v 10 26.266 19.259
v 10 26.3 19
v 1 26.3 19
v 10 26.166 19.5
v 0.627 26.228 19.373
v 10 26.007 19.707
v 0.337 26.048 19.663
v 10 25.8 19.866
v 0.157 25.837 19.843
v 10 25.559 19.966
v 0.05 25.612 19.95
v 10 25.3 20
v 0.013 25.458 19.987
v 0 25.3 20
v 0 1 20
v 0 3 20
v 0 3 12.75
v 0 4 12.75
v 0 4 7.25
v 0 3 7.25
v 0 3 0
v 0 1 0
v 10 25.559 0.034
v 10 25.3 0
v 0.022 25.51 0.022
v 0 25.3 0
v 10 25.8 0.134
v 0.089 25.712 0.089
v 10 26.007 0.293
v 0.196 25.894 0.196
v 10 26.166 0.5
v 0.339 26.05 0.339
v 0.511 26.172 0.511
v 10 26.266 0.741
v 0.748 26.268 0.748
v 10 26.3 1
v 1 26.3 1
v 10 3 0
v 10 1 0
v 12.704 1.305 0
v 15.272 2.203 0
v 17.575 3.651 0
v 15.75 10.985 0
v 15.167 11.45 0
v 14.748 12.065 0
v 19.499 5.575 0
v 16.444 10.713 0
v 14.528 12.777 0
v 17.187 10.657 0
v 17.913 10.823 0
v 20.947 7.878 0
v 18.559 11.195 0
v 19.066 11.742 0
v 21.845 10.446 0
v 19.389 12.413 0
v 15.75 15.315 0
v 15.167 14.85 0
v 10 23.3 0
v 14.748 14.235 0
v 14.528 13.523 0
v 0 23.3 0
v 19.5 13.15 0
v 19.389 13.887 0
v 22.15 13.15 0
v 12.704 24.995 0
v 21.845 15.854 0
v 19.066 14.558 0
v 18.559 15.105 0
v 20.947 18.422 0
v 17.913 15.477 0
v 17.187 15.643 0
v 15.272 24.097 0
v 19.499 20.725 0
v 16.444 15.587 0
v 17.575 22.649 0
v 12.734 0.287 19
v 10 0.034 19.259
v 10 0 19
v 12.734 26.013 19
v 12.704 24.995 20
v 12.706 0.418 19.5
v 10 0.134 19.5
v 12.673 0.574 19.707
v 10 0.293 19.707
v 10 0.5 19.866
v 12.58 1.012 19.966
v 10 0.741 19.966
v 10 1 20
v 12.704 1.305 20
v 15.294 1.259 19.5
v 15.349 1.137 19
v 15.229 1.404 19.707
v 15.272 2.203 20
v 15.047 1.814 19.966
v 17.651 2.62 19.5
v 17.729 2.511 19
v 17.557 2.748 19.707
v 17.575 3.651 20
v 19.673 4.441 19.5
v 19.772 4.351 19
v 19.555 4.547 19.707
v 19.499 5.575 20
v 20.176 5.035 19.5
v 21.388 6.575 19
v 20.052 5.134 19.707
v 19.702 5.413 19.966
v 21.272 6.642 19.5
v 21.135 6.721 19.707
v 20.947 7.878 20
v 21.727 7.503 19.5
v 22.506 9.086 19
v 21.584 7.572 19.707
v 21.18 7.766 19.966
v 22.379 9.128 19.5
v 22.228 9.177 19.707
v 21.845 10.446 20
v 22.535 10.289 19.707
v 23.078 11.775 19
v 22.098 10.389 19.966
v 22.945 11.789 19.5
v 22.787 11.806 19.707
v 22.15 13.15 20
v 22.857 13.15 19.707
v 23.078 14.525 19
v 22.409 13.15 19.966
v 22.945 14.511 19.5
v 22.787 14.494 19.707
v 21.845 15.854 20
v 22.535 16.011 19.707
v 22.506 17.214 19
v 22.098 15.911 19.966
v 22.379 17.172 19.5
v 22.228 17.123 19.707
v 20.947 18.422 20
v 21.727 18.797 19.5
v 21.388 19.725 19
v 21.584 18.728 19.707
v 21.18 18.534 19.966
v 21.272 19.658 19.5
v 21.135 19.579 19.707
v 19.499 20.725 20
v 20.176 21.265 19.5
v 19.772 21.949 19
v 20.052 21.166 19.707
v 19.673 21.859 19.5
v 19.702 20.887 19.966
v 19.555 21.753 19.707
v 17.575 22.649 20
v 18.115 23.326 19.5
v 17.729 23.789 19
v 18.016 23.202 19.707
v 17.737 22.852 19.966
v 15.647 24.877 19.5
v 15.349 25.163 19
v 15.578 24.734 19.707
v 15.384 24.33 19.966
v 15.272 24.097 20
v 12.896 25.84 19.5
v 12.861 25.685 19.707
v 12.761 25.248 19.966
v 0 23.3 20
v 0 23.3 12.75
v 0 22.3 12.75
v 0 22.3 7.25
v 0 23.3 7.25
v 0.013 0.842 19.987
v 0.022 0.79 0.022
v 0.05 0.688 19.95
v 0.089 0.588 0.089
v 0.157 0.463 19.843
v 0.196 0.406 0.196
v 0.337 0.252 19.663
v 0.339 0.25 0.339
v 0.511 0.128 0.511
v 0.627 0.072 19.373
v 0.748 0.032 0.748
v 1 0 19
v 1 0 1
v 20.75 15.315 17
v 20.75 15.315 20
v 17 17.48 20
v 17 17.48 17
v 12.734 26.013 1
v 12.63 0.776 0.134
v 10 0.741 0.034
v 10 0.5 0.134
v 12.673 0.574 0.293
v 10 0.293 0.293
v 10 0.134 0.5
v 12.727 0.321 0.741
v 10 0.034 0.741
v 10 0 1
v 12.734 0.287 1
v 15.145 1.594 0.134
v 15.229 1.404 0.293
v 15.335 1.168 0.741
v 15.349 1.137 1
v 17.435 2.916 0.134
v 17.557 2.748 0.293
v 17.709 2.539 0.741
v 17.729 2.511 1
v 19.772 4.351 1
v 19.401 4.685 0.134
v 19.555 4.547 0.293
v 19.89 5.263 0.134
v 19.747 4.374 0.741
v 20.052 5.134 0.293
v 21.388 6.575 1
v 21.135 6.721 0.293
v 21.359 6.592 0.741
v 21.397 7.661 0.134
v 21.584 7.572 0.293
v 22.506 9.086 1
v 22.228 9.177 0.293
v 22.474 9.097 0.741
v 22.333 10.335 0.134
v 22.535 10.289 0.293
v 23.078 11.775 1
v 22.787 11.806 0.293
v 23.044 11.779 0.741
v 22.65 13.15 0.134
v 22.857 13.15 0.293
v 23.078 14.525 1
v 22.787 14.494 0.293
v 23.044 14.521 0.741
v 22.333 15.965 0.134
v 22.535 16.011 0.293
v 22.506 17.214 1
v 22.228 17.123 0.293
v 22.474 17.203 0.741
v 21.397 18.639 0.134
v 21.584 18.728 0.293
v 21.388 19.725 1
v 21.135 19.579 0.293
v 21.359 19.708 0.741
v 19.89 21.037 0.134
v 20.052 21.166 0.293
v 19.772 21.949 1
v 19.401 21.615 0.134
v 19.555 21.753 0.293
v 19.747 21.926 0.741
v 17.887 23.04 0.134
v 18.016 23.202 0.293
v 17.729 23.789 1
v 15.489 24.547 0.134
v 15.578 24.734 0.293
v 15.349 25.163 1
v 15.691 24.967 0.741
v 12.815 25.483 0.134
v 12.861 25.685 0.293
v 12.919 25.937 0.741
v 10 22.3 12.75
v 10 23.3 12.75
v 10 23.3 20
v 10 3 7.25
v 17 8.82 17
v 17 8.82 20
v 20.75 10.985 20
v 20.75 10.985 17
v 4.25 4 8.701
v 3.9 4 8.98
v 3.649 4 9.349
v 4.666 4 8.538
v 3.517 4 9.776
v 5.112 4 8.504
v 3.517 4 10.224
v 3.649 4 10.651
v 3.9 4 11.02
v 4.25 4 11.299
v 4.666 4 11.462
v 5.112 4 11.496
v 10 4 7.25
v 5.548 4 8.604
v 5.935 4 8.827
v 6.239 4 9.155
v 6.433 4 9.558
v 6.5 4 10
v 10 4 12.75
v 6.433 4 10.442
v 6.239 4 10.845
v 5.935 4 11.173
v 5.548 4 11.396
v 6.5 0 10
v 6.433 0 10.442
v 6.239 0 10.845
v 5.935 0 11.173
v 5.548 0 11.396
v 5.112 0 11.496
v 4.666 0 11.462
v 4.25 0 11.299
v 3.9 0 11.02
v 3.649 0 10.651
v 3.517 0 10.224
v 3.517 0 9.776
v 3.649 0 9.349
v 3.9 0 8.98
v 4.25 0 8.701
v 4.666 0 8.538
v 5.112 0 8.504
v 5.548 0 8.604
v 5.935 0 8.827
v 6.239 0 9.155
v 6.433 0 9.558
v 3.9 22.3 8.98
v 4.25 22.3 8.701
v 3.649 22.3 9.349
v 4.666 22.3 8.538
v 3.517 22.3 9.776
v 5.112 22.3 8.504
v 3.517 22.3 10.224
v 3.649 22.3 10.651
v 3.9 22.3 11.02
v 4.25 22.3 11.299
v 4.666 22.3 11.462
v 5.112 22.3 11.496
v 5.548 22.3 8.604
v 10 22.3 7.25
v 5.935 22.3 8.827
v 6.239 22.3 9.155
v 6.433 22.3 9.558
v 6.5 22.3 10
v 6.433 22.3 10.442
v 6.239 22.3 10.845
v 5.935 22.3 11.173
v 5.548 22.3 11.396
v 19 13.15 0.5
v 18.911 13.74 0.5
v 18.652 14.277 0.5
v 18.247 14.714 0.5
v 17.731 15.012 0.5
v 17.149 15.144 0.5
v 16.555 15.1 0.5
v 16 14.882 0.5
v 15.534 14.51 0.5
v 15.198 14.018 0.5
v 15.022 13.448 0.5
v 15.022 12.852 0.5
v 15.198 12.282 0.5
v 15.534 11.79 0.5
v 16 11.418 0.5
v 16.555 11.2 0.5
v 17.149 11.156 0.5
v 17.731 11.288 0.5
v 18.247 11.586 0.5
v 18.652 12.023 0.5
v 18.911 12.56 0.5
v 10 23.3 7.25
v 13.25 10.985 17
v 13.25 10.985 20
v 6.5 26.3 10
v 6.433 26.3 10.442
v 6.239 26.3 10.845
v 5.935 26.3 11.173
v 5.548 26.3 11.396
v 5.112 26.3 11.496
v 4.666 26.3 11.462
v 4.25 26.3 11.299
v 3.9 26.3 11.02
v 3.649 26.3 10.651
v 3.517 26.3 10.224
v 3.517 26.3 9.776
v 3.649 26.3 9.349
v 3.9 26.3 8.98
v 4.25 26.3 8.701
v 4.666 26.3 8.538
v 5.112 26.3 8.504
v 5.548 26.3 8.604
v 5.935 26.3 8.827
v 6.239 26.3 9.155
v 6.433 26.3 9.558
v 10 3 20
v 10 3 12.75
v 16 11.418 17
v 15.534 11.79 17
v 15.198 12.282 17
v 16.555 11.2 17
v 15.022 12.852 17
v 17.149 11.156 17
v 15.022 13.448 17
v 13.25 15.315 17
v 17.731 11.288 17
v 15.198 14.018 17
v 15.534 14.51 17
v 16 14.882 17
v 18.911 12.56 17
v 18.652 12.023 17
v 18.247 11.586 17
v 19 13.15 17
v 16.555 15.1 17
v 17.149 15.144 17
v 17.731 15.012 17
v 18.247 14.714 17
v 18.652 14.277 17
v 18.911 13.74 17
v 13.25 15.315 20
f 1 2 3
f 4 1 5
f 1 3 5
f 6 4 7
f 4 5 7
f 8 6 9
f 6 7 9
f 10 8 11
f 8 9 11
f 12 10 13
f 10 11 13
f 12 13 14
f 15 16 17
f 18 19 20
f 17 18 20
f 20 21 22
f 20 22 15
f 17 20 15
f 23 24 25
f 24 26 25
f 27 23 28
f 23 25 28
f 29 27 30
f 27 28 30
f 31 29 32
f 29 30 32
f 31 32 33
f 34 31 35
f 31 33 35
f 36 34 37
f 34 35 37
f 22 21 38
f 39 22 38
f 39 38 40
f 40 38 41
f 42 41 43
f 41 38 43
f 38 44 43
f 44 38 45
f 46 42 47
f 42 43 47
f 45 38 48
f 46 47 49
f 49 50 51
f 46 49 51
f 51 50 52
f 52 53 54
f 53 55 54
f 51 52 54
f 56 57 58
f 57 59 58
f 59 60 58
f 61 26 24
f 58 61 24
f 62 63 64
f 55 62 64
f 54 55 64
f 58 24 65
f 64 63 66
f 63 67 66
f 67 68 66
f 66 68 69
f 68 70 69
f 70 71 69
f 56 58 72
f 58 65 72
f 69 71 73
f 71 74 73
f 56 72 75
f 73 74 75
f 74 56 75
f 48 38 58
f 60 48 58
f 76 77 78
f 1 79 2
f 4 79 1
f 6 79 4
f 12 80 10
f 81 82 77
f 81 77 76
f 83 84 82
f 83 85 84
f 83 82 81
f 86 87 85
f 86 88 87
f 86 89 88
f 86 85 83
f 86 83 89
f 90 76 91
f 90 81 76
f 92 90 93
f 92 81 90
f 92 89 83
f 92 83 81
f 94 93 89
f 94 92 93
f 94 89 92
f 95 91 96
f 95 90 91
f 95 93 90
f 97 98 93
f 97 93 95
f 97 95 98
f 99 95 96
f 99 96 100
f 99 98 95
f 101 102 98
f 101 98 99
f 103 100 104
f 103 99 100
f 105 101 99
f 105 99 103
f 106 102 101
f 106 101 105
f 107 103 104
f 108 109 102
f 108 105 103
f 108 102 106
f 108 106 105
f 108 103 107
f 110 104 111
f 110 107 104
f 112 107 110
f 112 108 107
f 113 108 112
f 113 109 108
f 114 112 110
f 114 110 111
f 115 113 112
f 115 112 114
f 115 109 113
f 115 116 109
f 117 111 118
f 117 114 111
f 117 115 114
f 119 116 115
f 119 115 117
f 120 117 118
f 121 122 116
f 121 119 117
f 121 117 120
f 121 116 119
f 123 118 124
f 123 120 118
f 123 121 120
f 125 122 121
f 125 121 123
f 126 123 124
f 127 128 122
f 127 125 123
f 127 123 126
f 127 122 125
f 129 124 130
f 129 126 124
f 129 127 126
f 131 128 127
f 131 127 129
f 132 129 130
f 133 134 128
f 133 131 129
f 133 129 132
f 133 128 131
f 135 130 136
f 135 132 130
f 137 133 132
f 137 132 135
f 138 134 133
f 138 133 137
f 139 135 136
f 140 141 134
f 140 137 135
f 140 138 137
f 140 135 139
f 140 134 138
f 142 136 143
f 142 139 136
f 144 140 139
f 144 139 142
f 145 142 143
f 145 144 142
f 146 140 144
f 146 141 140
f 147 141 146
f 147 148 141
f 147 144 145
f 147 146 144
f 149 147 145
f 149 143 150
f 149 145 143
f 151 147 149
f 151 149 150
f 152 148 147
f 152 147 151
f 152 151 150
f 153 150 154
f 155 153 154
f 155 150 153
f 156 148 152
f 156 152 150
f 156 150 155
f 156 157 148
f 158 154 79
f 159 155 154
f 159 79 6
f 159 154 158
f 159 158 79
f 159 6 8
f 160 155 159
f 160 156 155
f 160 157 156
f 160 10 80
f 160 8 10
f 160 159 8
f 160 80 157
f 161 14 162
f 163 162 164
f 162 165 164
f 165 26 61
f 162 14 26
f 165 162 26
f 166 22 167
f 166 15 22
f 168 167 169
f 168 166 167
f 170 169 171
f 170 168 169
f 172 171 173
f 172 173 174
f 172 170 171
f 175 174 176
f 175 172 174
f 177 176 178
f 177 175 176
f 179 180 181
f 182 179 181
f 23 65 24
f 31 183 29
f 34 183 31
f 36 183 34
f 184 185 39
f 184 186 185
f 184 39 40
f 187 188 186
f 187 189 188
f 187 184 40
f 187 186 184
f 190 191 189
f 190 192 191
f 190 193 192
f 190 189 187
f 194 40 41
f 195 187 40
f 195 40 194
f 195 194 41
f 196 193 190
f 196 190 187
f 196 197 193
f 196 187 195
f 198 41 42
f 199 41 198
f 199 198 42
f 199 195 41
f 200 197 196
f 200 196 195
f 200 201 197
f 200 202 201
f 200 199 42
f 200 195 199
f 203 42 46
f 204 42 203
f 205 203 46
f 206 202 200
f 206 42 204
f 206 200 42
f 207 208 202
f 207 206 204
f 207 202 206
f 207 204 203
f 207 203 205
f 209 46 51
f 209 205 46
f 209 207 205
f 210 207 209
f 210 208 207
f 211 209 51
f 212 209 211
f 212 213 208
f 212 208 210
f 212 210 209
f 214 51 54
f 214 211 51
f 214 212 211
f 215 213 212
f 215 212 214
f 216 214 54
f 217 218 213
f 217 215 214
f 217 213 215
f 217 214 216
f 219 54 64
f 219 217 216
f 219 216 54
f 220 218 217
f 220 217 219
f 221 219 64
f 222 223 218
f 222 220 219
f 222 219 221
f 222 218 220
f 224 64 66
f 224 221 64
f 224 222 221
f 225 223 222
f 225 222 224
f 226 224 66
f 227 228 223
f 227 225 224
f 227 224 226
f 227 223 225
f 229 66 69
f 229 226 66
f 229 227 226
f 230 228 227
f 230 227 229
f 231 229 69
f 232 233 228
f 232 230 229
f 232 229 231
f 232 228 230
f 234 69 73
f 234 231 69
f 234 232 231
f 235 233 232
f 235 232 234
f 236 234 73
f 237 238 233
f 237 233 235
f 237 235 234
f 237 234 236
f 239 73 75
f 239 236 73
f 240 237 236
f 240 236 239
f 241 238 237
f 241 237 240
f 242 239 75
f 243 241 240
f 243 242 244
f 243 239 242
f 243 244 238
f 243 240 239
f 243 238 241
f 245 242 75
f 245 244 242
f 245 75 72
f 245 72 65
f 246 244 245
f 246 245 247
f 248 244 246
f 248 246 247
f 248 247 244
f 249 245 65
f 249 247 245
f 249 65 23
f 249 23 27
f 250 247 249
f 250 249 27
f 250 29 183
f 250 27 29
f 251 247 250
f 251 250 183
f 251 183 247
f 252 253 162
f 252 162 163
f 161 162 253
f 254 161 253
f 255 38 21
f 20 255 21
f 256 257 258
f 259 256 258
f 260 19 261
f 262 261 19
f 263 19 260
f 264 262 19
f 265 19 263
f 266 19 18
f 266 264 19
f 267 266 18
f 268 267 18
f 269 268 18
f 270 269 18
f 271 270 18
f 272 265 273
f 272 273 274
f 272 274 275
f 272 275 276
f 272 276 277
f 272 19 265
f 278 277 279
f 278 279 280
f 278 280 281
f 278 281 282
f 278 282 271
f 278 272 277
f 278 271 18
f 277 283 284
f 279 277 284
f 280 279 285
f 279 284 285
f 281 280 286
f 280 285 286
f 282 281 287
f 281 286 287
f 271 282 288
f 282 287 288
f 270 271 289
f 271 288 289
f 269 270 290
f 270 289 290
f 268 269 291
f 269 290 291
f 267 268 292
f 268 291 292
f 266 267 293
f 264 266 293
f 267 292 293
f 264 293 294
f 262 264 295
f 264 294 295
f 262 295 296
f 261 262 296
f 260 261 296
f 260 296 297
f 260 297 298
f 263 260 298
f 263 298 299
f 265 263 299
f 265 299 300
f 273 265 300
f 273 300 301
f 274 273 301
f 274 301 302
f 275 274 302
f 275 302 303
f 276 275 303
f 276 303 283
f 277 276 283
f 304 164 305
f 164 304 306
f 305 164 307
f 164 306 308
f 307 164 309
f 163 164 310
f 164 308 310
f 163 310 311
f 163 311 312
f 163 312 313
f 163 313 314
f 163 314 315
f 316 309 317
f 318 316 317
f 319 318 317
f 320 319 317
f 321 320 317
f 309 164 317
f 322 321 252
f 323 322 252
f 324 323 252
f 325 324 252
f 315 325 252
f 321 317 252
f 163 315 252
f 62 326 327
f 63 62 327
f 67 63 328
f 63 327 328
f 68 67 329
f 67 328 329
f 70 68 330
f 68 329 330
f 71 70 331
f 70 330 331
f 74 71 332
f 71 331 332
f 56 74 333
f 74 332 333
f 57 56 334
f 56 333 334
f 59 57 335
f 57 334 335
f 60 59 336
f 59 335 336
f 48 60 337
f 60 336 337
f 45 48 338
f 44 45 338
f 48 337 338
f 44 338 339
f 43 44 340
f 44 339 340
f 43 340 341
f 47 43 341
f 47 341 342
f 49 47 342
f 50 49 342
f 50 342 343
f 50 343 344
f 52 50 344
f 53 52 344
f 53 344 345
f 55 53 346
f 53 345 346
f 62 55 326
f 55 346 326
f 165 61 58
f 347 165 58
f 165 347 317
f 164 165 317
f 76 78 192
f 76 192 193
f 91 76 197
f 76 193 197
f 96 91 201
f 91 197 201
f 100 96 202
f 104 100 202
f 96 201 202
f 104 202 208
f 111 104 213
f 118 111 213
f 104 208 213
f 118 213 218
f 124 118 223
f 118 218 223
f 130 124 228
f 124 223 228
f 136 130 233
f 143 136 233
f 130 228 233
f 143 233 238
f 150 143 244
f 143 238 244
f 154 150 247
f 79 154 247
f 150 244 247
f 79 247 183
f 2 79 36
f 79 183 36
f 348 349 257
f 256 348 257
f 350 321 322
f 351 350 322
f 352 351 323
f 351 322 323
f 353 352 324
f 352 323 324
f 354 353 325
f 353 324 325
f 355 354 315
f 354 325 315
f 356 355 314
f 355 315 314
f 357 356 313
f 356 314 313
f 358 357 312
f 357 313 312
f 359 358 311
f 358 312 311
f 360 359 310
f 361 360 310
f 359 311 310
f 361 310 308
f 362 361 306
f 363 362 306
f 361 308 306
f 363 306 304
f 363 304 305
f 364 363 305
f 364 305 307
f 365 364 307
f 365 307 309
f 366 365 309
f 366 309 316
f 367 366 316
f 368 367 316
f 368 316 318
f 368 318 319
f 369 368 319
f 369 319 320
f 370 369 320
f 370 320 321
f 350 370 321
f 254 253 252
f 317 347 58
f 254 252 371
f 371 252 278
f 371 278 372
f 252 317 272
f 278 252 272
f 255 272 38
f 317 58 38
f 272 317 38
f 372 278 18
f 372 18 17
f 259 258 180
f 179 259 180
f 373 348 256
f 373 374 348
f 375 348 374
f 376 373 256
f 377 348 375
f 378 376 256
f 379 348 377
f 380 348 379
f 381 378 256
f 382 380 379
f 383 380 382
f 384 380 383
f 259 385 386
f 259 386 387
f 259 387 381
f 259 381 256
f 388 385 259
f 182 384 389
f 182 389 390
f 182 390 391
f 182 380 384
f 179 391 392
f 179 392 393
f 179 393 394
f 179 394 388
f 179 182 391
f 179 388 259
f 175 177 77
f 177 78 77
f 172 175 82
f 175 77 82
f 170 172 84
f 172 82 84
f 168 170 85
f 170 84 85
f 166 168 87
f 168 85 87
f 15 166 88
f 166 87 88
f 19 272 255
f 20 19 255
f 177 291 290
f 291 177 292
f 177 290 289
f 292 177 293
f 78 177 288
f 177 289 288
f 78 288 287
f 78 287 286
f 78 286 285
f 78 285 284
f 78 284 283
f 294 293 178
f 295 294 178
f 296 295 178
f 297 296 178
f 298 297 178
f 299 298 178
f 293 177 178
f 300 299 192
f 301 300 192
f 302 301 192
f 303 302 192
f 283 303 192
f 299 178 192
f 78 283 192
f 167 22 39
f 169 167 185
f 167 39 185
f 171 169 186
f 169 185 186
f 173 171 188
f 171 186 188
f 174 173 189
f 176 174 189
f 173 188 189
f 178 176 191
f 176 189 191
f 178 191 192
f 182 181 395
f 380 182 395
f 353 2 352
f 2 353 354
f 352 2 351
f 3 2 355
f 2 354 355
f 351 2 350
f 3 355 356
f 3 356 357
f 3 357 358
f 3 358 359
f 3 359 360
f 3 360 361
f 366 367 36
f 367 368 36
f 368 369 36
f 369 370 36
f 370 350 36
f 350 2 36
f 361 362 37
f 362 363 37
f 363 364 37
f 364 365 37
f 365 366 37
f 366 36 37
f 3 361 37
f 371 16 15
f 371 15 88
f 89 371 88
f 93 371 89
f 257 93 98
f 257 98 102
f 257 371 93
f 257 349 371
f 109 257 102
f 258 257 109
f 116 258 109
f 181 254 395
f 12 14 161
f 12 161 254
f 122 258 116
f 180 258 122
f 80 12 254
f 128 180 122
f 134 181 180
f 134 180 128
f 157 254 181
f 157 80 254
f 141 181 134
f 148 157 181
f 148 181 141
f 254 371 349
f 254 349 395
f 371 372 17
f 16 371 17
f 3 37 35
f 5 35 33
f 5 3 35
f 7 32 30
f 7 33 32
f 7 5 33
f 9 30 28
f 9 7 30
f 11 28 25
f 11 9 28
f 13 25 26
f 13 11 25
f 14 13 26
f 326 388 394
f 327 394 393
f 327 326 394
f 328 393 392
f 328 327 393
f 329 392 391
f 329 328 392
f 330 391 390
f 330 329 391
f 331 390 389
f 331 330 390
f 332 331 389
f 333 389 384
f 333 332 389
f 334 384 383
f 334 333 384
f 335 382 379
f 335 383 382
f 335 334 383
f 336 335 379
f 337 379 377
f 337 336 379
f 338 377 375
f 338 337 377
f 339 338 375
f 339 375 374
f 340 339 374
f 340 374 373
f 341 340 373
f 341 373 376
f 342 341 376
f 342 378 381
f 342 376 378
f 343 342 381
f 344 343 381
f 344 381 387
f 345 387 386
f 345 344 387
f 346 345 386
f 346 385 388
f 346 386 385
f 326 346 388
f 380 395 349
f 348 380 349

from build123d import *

# Parameters (mm, degrees)
F0_R     = 2
F1_DEPTH = 20
F2_W     = 1
F2_H     = 5.5
F3_DEPTH = 10
F4_R     = 1.5
F5_DEPTH = 26.301
F6_SIZE  = 0.5
F7_R     = 1
F9_DEPTH = 3


with BuildPart() as f1:
    # F0 (on Top) → F1 (new body)
    with BuildSketch(Plane.XY):
        with BuildLine():
            Line((0, 3), (0, 0))
            Line((0, 0), (10, 0))
            ThreePointArc((10, 0), (23.15, 13.15), (10, 26.3))
            Line((10, 26.3), (0, 26.3))
            Line((0, 26.3), (0, 23.3))
            Line((0, 23.3), (10, 23.3))
            Line((10, 23.3), (10, 3))
            Line((10, 3), (0, 3))
        make_face()
        with Locations((17, 13.15)):
            Circle(F0_R, mode=Mode.SUBTRACT)
    extrude(amount=F1_DEPTH)

    # F2 (on face) → F3 (join, through all)
    with BuildSketch(Plane(origin=(10, 0, 0), x_dir=(0, -1, 0), z_dir=(-1, 0, 0))):
        with Locations((-22.8, 10)):
            Rectangle(F2_W, F2_H)
        with Locations((-3.5, 10)):
            Rectangle(F2_W, F2_H)
    extrude(amount=F3_DEPTH)

    # F4 (on face) → F5 (cut, through all)
    with BuildSketch(Plane.XZ):
        with Locations((5, 10)):
            Circle(F4_R)
    extrude(amount=-F5_DEPTH, mode=Mode.SUBTRACT)

    # F6
    f6_edges = [f1.edges().sort_by_distance(p)[0] for p in [
        (15, 13.15, 0),
    ]]
    chamfer(f6_edges, length=F6_SIZE)

    # F7
    f7_edges = [f1.edges().sort_by_distance(p)[0] for p in [
        (23.15, 13.15, 20),
        (23.15, 13.15, 0),
        (0, 0, 10),
        (0, 26.3, 10),
    ]]
    fillet(f7_edges, radius=F7_R)

    # F8 (on face) → F9 (cut)
    with BuildSketch(Plane.XY.offset(20)):
        Polygon((20.75, 10.984936), (20.75, 15.315064), (17, 17.480127), (13.25, 15.315064), (13.25, 10.984936), (17, 8.819873), align=None)
    extrude(amount=-F9_DEPTH, mode=Mode.SUBTRACT)


solid = f1.part
